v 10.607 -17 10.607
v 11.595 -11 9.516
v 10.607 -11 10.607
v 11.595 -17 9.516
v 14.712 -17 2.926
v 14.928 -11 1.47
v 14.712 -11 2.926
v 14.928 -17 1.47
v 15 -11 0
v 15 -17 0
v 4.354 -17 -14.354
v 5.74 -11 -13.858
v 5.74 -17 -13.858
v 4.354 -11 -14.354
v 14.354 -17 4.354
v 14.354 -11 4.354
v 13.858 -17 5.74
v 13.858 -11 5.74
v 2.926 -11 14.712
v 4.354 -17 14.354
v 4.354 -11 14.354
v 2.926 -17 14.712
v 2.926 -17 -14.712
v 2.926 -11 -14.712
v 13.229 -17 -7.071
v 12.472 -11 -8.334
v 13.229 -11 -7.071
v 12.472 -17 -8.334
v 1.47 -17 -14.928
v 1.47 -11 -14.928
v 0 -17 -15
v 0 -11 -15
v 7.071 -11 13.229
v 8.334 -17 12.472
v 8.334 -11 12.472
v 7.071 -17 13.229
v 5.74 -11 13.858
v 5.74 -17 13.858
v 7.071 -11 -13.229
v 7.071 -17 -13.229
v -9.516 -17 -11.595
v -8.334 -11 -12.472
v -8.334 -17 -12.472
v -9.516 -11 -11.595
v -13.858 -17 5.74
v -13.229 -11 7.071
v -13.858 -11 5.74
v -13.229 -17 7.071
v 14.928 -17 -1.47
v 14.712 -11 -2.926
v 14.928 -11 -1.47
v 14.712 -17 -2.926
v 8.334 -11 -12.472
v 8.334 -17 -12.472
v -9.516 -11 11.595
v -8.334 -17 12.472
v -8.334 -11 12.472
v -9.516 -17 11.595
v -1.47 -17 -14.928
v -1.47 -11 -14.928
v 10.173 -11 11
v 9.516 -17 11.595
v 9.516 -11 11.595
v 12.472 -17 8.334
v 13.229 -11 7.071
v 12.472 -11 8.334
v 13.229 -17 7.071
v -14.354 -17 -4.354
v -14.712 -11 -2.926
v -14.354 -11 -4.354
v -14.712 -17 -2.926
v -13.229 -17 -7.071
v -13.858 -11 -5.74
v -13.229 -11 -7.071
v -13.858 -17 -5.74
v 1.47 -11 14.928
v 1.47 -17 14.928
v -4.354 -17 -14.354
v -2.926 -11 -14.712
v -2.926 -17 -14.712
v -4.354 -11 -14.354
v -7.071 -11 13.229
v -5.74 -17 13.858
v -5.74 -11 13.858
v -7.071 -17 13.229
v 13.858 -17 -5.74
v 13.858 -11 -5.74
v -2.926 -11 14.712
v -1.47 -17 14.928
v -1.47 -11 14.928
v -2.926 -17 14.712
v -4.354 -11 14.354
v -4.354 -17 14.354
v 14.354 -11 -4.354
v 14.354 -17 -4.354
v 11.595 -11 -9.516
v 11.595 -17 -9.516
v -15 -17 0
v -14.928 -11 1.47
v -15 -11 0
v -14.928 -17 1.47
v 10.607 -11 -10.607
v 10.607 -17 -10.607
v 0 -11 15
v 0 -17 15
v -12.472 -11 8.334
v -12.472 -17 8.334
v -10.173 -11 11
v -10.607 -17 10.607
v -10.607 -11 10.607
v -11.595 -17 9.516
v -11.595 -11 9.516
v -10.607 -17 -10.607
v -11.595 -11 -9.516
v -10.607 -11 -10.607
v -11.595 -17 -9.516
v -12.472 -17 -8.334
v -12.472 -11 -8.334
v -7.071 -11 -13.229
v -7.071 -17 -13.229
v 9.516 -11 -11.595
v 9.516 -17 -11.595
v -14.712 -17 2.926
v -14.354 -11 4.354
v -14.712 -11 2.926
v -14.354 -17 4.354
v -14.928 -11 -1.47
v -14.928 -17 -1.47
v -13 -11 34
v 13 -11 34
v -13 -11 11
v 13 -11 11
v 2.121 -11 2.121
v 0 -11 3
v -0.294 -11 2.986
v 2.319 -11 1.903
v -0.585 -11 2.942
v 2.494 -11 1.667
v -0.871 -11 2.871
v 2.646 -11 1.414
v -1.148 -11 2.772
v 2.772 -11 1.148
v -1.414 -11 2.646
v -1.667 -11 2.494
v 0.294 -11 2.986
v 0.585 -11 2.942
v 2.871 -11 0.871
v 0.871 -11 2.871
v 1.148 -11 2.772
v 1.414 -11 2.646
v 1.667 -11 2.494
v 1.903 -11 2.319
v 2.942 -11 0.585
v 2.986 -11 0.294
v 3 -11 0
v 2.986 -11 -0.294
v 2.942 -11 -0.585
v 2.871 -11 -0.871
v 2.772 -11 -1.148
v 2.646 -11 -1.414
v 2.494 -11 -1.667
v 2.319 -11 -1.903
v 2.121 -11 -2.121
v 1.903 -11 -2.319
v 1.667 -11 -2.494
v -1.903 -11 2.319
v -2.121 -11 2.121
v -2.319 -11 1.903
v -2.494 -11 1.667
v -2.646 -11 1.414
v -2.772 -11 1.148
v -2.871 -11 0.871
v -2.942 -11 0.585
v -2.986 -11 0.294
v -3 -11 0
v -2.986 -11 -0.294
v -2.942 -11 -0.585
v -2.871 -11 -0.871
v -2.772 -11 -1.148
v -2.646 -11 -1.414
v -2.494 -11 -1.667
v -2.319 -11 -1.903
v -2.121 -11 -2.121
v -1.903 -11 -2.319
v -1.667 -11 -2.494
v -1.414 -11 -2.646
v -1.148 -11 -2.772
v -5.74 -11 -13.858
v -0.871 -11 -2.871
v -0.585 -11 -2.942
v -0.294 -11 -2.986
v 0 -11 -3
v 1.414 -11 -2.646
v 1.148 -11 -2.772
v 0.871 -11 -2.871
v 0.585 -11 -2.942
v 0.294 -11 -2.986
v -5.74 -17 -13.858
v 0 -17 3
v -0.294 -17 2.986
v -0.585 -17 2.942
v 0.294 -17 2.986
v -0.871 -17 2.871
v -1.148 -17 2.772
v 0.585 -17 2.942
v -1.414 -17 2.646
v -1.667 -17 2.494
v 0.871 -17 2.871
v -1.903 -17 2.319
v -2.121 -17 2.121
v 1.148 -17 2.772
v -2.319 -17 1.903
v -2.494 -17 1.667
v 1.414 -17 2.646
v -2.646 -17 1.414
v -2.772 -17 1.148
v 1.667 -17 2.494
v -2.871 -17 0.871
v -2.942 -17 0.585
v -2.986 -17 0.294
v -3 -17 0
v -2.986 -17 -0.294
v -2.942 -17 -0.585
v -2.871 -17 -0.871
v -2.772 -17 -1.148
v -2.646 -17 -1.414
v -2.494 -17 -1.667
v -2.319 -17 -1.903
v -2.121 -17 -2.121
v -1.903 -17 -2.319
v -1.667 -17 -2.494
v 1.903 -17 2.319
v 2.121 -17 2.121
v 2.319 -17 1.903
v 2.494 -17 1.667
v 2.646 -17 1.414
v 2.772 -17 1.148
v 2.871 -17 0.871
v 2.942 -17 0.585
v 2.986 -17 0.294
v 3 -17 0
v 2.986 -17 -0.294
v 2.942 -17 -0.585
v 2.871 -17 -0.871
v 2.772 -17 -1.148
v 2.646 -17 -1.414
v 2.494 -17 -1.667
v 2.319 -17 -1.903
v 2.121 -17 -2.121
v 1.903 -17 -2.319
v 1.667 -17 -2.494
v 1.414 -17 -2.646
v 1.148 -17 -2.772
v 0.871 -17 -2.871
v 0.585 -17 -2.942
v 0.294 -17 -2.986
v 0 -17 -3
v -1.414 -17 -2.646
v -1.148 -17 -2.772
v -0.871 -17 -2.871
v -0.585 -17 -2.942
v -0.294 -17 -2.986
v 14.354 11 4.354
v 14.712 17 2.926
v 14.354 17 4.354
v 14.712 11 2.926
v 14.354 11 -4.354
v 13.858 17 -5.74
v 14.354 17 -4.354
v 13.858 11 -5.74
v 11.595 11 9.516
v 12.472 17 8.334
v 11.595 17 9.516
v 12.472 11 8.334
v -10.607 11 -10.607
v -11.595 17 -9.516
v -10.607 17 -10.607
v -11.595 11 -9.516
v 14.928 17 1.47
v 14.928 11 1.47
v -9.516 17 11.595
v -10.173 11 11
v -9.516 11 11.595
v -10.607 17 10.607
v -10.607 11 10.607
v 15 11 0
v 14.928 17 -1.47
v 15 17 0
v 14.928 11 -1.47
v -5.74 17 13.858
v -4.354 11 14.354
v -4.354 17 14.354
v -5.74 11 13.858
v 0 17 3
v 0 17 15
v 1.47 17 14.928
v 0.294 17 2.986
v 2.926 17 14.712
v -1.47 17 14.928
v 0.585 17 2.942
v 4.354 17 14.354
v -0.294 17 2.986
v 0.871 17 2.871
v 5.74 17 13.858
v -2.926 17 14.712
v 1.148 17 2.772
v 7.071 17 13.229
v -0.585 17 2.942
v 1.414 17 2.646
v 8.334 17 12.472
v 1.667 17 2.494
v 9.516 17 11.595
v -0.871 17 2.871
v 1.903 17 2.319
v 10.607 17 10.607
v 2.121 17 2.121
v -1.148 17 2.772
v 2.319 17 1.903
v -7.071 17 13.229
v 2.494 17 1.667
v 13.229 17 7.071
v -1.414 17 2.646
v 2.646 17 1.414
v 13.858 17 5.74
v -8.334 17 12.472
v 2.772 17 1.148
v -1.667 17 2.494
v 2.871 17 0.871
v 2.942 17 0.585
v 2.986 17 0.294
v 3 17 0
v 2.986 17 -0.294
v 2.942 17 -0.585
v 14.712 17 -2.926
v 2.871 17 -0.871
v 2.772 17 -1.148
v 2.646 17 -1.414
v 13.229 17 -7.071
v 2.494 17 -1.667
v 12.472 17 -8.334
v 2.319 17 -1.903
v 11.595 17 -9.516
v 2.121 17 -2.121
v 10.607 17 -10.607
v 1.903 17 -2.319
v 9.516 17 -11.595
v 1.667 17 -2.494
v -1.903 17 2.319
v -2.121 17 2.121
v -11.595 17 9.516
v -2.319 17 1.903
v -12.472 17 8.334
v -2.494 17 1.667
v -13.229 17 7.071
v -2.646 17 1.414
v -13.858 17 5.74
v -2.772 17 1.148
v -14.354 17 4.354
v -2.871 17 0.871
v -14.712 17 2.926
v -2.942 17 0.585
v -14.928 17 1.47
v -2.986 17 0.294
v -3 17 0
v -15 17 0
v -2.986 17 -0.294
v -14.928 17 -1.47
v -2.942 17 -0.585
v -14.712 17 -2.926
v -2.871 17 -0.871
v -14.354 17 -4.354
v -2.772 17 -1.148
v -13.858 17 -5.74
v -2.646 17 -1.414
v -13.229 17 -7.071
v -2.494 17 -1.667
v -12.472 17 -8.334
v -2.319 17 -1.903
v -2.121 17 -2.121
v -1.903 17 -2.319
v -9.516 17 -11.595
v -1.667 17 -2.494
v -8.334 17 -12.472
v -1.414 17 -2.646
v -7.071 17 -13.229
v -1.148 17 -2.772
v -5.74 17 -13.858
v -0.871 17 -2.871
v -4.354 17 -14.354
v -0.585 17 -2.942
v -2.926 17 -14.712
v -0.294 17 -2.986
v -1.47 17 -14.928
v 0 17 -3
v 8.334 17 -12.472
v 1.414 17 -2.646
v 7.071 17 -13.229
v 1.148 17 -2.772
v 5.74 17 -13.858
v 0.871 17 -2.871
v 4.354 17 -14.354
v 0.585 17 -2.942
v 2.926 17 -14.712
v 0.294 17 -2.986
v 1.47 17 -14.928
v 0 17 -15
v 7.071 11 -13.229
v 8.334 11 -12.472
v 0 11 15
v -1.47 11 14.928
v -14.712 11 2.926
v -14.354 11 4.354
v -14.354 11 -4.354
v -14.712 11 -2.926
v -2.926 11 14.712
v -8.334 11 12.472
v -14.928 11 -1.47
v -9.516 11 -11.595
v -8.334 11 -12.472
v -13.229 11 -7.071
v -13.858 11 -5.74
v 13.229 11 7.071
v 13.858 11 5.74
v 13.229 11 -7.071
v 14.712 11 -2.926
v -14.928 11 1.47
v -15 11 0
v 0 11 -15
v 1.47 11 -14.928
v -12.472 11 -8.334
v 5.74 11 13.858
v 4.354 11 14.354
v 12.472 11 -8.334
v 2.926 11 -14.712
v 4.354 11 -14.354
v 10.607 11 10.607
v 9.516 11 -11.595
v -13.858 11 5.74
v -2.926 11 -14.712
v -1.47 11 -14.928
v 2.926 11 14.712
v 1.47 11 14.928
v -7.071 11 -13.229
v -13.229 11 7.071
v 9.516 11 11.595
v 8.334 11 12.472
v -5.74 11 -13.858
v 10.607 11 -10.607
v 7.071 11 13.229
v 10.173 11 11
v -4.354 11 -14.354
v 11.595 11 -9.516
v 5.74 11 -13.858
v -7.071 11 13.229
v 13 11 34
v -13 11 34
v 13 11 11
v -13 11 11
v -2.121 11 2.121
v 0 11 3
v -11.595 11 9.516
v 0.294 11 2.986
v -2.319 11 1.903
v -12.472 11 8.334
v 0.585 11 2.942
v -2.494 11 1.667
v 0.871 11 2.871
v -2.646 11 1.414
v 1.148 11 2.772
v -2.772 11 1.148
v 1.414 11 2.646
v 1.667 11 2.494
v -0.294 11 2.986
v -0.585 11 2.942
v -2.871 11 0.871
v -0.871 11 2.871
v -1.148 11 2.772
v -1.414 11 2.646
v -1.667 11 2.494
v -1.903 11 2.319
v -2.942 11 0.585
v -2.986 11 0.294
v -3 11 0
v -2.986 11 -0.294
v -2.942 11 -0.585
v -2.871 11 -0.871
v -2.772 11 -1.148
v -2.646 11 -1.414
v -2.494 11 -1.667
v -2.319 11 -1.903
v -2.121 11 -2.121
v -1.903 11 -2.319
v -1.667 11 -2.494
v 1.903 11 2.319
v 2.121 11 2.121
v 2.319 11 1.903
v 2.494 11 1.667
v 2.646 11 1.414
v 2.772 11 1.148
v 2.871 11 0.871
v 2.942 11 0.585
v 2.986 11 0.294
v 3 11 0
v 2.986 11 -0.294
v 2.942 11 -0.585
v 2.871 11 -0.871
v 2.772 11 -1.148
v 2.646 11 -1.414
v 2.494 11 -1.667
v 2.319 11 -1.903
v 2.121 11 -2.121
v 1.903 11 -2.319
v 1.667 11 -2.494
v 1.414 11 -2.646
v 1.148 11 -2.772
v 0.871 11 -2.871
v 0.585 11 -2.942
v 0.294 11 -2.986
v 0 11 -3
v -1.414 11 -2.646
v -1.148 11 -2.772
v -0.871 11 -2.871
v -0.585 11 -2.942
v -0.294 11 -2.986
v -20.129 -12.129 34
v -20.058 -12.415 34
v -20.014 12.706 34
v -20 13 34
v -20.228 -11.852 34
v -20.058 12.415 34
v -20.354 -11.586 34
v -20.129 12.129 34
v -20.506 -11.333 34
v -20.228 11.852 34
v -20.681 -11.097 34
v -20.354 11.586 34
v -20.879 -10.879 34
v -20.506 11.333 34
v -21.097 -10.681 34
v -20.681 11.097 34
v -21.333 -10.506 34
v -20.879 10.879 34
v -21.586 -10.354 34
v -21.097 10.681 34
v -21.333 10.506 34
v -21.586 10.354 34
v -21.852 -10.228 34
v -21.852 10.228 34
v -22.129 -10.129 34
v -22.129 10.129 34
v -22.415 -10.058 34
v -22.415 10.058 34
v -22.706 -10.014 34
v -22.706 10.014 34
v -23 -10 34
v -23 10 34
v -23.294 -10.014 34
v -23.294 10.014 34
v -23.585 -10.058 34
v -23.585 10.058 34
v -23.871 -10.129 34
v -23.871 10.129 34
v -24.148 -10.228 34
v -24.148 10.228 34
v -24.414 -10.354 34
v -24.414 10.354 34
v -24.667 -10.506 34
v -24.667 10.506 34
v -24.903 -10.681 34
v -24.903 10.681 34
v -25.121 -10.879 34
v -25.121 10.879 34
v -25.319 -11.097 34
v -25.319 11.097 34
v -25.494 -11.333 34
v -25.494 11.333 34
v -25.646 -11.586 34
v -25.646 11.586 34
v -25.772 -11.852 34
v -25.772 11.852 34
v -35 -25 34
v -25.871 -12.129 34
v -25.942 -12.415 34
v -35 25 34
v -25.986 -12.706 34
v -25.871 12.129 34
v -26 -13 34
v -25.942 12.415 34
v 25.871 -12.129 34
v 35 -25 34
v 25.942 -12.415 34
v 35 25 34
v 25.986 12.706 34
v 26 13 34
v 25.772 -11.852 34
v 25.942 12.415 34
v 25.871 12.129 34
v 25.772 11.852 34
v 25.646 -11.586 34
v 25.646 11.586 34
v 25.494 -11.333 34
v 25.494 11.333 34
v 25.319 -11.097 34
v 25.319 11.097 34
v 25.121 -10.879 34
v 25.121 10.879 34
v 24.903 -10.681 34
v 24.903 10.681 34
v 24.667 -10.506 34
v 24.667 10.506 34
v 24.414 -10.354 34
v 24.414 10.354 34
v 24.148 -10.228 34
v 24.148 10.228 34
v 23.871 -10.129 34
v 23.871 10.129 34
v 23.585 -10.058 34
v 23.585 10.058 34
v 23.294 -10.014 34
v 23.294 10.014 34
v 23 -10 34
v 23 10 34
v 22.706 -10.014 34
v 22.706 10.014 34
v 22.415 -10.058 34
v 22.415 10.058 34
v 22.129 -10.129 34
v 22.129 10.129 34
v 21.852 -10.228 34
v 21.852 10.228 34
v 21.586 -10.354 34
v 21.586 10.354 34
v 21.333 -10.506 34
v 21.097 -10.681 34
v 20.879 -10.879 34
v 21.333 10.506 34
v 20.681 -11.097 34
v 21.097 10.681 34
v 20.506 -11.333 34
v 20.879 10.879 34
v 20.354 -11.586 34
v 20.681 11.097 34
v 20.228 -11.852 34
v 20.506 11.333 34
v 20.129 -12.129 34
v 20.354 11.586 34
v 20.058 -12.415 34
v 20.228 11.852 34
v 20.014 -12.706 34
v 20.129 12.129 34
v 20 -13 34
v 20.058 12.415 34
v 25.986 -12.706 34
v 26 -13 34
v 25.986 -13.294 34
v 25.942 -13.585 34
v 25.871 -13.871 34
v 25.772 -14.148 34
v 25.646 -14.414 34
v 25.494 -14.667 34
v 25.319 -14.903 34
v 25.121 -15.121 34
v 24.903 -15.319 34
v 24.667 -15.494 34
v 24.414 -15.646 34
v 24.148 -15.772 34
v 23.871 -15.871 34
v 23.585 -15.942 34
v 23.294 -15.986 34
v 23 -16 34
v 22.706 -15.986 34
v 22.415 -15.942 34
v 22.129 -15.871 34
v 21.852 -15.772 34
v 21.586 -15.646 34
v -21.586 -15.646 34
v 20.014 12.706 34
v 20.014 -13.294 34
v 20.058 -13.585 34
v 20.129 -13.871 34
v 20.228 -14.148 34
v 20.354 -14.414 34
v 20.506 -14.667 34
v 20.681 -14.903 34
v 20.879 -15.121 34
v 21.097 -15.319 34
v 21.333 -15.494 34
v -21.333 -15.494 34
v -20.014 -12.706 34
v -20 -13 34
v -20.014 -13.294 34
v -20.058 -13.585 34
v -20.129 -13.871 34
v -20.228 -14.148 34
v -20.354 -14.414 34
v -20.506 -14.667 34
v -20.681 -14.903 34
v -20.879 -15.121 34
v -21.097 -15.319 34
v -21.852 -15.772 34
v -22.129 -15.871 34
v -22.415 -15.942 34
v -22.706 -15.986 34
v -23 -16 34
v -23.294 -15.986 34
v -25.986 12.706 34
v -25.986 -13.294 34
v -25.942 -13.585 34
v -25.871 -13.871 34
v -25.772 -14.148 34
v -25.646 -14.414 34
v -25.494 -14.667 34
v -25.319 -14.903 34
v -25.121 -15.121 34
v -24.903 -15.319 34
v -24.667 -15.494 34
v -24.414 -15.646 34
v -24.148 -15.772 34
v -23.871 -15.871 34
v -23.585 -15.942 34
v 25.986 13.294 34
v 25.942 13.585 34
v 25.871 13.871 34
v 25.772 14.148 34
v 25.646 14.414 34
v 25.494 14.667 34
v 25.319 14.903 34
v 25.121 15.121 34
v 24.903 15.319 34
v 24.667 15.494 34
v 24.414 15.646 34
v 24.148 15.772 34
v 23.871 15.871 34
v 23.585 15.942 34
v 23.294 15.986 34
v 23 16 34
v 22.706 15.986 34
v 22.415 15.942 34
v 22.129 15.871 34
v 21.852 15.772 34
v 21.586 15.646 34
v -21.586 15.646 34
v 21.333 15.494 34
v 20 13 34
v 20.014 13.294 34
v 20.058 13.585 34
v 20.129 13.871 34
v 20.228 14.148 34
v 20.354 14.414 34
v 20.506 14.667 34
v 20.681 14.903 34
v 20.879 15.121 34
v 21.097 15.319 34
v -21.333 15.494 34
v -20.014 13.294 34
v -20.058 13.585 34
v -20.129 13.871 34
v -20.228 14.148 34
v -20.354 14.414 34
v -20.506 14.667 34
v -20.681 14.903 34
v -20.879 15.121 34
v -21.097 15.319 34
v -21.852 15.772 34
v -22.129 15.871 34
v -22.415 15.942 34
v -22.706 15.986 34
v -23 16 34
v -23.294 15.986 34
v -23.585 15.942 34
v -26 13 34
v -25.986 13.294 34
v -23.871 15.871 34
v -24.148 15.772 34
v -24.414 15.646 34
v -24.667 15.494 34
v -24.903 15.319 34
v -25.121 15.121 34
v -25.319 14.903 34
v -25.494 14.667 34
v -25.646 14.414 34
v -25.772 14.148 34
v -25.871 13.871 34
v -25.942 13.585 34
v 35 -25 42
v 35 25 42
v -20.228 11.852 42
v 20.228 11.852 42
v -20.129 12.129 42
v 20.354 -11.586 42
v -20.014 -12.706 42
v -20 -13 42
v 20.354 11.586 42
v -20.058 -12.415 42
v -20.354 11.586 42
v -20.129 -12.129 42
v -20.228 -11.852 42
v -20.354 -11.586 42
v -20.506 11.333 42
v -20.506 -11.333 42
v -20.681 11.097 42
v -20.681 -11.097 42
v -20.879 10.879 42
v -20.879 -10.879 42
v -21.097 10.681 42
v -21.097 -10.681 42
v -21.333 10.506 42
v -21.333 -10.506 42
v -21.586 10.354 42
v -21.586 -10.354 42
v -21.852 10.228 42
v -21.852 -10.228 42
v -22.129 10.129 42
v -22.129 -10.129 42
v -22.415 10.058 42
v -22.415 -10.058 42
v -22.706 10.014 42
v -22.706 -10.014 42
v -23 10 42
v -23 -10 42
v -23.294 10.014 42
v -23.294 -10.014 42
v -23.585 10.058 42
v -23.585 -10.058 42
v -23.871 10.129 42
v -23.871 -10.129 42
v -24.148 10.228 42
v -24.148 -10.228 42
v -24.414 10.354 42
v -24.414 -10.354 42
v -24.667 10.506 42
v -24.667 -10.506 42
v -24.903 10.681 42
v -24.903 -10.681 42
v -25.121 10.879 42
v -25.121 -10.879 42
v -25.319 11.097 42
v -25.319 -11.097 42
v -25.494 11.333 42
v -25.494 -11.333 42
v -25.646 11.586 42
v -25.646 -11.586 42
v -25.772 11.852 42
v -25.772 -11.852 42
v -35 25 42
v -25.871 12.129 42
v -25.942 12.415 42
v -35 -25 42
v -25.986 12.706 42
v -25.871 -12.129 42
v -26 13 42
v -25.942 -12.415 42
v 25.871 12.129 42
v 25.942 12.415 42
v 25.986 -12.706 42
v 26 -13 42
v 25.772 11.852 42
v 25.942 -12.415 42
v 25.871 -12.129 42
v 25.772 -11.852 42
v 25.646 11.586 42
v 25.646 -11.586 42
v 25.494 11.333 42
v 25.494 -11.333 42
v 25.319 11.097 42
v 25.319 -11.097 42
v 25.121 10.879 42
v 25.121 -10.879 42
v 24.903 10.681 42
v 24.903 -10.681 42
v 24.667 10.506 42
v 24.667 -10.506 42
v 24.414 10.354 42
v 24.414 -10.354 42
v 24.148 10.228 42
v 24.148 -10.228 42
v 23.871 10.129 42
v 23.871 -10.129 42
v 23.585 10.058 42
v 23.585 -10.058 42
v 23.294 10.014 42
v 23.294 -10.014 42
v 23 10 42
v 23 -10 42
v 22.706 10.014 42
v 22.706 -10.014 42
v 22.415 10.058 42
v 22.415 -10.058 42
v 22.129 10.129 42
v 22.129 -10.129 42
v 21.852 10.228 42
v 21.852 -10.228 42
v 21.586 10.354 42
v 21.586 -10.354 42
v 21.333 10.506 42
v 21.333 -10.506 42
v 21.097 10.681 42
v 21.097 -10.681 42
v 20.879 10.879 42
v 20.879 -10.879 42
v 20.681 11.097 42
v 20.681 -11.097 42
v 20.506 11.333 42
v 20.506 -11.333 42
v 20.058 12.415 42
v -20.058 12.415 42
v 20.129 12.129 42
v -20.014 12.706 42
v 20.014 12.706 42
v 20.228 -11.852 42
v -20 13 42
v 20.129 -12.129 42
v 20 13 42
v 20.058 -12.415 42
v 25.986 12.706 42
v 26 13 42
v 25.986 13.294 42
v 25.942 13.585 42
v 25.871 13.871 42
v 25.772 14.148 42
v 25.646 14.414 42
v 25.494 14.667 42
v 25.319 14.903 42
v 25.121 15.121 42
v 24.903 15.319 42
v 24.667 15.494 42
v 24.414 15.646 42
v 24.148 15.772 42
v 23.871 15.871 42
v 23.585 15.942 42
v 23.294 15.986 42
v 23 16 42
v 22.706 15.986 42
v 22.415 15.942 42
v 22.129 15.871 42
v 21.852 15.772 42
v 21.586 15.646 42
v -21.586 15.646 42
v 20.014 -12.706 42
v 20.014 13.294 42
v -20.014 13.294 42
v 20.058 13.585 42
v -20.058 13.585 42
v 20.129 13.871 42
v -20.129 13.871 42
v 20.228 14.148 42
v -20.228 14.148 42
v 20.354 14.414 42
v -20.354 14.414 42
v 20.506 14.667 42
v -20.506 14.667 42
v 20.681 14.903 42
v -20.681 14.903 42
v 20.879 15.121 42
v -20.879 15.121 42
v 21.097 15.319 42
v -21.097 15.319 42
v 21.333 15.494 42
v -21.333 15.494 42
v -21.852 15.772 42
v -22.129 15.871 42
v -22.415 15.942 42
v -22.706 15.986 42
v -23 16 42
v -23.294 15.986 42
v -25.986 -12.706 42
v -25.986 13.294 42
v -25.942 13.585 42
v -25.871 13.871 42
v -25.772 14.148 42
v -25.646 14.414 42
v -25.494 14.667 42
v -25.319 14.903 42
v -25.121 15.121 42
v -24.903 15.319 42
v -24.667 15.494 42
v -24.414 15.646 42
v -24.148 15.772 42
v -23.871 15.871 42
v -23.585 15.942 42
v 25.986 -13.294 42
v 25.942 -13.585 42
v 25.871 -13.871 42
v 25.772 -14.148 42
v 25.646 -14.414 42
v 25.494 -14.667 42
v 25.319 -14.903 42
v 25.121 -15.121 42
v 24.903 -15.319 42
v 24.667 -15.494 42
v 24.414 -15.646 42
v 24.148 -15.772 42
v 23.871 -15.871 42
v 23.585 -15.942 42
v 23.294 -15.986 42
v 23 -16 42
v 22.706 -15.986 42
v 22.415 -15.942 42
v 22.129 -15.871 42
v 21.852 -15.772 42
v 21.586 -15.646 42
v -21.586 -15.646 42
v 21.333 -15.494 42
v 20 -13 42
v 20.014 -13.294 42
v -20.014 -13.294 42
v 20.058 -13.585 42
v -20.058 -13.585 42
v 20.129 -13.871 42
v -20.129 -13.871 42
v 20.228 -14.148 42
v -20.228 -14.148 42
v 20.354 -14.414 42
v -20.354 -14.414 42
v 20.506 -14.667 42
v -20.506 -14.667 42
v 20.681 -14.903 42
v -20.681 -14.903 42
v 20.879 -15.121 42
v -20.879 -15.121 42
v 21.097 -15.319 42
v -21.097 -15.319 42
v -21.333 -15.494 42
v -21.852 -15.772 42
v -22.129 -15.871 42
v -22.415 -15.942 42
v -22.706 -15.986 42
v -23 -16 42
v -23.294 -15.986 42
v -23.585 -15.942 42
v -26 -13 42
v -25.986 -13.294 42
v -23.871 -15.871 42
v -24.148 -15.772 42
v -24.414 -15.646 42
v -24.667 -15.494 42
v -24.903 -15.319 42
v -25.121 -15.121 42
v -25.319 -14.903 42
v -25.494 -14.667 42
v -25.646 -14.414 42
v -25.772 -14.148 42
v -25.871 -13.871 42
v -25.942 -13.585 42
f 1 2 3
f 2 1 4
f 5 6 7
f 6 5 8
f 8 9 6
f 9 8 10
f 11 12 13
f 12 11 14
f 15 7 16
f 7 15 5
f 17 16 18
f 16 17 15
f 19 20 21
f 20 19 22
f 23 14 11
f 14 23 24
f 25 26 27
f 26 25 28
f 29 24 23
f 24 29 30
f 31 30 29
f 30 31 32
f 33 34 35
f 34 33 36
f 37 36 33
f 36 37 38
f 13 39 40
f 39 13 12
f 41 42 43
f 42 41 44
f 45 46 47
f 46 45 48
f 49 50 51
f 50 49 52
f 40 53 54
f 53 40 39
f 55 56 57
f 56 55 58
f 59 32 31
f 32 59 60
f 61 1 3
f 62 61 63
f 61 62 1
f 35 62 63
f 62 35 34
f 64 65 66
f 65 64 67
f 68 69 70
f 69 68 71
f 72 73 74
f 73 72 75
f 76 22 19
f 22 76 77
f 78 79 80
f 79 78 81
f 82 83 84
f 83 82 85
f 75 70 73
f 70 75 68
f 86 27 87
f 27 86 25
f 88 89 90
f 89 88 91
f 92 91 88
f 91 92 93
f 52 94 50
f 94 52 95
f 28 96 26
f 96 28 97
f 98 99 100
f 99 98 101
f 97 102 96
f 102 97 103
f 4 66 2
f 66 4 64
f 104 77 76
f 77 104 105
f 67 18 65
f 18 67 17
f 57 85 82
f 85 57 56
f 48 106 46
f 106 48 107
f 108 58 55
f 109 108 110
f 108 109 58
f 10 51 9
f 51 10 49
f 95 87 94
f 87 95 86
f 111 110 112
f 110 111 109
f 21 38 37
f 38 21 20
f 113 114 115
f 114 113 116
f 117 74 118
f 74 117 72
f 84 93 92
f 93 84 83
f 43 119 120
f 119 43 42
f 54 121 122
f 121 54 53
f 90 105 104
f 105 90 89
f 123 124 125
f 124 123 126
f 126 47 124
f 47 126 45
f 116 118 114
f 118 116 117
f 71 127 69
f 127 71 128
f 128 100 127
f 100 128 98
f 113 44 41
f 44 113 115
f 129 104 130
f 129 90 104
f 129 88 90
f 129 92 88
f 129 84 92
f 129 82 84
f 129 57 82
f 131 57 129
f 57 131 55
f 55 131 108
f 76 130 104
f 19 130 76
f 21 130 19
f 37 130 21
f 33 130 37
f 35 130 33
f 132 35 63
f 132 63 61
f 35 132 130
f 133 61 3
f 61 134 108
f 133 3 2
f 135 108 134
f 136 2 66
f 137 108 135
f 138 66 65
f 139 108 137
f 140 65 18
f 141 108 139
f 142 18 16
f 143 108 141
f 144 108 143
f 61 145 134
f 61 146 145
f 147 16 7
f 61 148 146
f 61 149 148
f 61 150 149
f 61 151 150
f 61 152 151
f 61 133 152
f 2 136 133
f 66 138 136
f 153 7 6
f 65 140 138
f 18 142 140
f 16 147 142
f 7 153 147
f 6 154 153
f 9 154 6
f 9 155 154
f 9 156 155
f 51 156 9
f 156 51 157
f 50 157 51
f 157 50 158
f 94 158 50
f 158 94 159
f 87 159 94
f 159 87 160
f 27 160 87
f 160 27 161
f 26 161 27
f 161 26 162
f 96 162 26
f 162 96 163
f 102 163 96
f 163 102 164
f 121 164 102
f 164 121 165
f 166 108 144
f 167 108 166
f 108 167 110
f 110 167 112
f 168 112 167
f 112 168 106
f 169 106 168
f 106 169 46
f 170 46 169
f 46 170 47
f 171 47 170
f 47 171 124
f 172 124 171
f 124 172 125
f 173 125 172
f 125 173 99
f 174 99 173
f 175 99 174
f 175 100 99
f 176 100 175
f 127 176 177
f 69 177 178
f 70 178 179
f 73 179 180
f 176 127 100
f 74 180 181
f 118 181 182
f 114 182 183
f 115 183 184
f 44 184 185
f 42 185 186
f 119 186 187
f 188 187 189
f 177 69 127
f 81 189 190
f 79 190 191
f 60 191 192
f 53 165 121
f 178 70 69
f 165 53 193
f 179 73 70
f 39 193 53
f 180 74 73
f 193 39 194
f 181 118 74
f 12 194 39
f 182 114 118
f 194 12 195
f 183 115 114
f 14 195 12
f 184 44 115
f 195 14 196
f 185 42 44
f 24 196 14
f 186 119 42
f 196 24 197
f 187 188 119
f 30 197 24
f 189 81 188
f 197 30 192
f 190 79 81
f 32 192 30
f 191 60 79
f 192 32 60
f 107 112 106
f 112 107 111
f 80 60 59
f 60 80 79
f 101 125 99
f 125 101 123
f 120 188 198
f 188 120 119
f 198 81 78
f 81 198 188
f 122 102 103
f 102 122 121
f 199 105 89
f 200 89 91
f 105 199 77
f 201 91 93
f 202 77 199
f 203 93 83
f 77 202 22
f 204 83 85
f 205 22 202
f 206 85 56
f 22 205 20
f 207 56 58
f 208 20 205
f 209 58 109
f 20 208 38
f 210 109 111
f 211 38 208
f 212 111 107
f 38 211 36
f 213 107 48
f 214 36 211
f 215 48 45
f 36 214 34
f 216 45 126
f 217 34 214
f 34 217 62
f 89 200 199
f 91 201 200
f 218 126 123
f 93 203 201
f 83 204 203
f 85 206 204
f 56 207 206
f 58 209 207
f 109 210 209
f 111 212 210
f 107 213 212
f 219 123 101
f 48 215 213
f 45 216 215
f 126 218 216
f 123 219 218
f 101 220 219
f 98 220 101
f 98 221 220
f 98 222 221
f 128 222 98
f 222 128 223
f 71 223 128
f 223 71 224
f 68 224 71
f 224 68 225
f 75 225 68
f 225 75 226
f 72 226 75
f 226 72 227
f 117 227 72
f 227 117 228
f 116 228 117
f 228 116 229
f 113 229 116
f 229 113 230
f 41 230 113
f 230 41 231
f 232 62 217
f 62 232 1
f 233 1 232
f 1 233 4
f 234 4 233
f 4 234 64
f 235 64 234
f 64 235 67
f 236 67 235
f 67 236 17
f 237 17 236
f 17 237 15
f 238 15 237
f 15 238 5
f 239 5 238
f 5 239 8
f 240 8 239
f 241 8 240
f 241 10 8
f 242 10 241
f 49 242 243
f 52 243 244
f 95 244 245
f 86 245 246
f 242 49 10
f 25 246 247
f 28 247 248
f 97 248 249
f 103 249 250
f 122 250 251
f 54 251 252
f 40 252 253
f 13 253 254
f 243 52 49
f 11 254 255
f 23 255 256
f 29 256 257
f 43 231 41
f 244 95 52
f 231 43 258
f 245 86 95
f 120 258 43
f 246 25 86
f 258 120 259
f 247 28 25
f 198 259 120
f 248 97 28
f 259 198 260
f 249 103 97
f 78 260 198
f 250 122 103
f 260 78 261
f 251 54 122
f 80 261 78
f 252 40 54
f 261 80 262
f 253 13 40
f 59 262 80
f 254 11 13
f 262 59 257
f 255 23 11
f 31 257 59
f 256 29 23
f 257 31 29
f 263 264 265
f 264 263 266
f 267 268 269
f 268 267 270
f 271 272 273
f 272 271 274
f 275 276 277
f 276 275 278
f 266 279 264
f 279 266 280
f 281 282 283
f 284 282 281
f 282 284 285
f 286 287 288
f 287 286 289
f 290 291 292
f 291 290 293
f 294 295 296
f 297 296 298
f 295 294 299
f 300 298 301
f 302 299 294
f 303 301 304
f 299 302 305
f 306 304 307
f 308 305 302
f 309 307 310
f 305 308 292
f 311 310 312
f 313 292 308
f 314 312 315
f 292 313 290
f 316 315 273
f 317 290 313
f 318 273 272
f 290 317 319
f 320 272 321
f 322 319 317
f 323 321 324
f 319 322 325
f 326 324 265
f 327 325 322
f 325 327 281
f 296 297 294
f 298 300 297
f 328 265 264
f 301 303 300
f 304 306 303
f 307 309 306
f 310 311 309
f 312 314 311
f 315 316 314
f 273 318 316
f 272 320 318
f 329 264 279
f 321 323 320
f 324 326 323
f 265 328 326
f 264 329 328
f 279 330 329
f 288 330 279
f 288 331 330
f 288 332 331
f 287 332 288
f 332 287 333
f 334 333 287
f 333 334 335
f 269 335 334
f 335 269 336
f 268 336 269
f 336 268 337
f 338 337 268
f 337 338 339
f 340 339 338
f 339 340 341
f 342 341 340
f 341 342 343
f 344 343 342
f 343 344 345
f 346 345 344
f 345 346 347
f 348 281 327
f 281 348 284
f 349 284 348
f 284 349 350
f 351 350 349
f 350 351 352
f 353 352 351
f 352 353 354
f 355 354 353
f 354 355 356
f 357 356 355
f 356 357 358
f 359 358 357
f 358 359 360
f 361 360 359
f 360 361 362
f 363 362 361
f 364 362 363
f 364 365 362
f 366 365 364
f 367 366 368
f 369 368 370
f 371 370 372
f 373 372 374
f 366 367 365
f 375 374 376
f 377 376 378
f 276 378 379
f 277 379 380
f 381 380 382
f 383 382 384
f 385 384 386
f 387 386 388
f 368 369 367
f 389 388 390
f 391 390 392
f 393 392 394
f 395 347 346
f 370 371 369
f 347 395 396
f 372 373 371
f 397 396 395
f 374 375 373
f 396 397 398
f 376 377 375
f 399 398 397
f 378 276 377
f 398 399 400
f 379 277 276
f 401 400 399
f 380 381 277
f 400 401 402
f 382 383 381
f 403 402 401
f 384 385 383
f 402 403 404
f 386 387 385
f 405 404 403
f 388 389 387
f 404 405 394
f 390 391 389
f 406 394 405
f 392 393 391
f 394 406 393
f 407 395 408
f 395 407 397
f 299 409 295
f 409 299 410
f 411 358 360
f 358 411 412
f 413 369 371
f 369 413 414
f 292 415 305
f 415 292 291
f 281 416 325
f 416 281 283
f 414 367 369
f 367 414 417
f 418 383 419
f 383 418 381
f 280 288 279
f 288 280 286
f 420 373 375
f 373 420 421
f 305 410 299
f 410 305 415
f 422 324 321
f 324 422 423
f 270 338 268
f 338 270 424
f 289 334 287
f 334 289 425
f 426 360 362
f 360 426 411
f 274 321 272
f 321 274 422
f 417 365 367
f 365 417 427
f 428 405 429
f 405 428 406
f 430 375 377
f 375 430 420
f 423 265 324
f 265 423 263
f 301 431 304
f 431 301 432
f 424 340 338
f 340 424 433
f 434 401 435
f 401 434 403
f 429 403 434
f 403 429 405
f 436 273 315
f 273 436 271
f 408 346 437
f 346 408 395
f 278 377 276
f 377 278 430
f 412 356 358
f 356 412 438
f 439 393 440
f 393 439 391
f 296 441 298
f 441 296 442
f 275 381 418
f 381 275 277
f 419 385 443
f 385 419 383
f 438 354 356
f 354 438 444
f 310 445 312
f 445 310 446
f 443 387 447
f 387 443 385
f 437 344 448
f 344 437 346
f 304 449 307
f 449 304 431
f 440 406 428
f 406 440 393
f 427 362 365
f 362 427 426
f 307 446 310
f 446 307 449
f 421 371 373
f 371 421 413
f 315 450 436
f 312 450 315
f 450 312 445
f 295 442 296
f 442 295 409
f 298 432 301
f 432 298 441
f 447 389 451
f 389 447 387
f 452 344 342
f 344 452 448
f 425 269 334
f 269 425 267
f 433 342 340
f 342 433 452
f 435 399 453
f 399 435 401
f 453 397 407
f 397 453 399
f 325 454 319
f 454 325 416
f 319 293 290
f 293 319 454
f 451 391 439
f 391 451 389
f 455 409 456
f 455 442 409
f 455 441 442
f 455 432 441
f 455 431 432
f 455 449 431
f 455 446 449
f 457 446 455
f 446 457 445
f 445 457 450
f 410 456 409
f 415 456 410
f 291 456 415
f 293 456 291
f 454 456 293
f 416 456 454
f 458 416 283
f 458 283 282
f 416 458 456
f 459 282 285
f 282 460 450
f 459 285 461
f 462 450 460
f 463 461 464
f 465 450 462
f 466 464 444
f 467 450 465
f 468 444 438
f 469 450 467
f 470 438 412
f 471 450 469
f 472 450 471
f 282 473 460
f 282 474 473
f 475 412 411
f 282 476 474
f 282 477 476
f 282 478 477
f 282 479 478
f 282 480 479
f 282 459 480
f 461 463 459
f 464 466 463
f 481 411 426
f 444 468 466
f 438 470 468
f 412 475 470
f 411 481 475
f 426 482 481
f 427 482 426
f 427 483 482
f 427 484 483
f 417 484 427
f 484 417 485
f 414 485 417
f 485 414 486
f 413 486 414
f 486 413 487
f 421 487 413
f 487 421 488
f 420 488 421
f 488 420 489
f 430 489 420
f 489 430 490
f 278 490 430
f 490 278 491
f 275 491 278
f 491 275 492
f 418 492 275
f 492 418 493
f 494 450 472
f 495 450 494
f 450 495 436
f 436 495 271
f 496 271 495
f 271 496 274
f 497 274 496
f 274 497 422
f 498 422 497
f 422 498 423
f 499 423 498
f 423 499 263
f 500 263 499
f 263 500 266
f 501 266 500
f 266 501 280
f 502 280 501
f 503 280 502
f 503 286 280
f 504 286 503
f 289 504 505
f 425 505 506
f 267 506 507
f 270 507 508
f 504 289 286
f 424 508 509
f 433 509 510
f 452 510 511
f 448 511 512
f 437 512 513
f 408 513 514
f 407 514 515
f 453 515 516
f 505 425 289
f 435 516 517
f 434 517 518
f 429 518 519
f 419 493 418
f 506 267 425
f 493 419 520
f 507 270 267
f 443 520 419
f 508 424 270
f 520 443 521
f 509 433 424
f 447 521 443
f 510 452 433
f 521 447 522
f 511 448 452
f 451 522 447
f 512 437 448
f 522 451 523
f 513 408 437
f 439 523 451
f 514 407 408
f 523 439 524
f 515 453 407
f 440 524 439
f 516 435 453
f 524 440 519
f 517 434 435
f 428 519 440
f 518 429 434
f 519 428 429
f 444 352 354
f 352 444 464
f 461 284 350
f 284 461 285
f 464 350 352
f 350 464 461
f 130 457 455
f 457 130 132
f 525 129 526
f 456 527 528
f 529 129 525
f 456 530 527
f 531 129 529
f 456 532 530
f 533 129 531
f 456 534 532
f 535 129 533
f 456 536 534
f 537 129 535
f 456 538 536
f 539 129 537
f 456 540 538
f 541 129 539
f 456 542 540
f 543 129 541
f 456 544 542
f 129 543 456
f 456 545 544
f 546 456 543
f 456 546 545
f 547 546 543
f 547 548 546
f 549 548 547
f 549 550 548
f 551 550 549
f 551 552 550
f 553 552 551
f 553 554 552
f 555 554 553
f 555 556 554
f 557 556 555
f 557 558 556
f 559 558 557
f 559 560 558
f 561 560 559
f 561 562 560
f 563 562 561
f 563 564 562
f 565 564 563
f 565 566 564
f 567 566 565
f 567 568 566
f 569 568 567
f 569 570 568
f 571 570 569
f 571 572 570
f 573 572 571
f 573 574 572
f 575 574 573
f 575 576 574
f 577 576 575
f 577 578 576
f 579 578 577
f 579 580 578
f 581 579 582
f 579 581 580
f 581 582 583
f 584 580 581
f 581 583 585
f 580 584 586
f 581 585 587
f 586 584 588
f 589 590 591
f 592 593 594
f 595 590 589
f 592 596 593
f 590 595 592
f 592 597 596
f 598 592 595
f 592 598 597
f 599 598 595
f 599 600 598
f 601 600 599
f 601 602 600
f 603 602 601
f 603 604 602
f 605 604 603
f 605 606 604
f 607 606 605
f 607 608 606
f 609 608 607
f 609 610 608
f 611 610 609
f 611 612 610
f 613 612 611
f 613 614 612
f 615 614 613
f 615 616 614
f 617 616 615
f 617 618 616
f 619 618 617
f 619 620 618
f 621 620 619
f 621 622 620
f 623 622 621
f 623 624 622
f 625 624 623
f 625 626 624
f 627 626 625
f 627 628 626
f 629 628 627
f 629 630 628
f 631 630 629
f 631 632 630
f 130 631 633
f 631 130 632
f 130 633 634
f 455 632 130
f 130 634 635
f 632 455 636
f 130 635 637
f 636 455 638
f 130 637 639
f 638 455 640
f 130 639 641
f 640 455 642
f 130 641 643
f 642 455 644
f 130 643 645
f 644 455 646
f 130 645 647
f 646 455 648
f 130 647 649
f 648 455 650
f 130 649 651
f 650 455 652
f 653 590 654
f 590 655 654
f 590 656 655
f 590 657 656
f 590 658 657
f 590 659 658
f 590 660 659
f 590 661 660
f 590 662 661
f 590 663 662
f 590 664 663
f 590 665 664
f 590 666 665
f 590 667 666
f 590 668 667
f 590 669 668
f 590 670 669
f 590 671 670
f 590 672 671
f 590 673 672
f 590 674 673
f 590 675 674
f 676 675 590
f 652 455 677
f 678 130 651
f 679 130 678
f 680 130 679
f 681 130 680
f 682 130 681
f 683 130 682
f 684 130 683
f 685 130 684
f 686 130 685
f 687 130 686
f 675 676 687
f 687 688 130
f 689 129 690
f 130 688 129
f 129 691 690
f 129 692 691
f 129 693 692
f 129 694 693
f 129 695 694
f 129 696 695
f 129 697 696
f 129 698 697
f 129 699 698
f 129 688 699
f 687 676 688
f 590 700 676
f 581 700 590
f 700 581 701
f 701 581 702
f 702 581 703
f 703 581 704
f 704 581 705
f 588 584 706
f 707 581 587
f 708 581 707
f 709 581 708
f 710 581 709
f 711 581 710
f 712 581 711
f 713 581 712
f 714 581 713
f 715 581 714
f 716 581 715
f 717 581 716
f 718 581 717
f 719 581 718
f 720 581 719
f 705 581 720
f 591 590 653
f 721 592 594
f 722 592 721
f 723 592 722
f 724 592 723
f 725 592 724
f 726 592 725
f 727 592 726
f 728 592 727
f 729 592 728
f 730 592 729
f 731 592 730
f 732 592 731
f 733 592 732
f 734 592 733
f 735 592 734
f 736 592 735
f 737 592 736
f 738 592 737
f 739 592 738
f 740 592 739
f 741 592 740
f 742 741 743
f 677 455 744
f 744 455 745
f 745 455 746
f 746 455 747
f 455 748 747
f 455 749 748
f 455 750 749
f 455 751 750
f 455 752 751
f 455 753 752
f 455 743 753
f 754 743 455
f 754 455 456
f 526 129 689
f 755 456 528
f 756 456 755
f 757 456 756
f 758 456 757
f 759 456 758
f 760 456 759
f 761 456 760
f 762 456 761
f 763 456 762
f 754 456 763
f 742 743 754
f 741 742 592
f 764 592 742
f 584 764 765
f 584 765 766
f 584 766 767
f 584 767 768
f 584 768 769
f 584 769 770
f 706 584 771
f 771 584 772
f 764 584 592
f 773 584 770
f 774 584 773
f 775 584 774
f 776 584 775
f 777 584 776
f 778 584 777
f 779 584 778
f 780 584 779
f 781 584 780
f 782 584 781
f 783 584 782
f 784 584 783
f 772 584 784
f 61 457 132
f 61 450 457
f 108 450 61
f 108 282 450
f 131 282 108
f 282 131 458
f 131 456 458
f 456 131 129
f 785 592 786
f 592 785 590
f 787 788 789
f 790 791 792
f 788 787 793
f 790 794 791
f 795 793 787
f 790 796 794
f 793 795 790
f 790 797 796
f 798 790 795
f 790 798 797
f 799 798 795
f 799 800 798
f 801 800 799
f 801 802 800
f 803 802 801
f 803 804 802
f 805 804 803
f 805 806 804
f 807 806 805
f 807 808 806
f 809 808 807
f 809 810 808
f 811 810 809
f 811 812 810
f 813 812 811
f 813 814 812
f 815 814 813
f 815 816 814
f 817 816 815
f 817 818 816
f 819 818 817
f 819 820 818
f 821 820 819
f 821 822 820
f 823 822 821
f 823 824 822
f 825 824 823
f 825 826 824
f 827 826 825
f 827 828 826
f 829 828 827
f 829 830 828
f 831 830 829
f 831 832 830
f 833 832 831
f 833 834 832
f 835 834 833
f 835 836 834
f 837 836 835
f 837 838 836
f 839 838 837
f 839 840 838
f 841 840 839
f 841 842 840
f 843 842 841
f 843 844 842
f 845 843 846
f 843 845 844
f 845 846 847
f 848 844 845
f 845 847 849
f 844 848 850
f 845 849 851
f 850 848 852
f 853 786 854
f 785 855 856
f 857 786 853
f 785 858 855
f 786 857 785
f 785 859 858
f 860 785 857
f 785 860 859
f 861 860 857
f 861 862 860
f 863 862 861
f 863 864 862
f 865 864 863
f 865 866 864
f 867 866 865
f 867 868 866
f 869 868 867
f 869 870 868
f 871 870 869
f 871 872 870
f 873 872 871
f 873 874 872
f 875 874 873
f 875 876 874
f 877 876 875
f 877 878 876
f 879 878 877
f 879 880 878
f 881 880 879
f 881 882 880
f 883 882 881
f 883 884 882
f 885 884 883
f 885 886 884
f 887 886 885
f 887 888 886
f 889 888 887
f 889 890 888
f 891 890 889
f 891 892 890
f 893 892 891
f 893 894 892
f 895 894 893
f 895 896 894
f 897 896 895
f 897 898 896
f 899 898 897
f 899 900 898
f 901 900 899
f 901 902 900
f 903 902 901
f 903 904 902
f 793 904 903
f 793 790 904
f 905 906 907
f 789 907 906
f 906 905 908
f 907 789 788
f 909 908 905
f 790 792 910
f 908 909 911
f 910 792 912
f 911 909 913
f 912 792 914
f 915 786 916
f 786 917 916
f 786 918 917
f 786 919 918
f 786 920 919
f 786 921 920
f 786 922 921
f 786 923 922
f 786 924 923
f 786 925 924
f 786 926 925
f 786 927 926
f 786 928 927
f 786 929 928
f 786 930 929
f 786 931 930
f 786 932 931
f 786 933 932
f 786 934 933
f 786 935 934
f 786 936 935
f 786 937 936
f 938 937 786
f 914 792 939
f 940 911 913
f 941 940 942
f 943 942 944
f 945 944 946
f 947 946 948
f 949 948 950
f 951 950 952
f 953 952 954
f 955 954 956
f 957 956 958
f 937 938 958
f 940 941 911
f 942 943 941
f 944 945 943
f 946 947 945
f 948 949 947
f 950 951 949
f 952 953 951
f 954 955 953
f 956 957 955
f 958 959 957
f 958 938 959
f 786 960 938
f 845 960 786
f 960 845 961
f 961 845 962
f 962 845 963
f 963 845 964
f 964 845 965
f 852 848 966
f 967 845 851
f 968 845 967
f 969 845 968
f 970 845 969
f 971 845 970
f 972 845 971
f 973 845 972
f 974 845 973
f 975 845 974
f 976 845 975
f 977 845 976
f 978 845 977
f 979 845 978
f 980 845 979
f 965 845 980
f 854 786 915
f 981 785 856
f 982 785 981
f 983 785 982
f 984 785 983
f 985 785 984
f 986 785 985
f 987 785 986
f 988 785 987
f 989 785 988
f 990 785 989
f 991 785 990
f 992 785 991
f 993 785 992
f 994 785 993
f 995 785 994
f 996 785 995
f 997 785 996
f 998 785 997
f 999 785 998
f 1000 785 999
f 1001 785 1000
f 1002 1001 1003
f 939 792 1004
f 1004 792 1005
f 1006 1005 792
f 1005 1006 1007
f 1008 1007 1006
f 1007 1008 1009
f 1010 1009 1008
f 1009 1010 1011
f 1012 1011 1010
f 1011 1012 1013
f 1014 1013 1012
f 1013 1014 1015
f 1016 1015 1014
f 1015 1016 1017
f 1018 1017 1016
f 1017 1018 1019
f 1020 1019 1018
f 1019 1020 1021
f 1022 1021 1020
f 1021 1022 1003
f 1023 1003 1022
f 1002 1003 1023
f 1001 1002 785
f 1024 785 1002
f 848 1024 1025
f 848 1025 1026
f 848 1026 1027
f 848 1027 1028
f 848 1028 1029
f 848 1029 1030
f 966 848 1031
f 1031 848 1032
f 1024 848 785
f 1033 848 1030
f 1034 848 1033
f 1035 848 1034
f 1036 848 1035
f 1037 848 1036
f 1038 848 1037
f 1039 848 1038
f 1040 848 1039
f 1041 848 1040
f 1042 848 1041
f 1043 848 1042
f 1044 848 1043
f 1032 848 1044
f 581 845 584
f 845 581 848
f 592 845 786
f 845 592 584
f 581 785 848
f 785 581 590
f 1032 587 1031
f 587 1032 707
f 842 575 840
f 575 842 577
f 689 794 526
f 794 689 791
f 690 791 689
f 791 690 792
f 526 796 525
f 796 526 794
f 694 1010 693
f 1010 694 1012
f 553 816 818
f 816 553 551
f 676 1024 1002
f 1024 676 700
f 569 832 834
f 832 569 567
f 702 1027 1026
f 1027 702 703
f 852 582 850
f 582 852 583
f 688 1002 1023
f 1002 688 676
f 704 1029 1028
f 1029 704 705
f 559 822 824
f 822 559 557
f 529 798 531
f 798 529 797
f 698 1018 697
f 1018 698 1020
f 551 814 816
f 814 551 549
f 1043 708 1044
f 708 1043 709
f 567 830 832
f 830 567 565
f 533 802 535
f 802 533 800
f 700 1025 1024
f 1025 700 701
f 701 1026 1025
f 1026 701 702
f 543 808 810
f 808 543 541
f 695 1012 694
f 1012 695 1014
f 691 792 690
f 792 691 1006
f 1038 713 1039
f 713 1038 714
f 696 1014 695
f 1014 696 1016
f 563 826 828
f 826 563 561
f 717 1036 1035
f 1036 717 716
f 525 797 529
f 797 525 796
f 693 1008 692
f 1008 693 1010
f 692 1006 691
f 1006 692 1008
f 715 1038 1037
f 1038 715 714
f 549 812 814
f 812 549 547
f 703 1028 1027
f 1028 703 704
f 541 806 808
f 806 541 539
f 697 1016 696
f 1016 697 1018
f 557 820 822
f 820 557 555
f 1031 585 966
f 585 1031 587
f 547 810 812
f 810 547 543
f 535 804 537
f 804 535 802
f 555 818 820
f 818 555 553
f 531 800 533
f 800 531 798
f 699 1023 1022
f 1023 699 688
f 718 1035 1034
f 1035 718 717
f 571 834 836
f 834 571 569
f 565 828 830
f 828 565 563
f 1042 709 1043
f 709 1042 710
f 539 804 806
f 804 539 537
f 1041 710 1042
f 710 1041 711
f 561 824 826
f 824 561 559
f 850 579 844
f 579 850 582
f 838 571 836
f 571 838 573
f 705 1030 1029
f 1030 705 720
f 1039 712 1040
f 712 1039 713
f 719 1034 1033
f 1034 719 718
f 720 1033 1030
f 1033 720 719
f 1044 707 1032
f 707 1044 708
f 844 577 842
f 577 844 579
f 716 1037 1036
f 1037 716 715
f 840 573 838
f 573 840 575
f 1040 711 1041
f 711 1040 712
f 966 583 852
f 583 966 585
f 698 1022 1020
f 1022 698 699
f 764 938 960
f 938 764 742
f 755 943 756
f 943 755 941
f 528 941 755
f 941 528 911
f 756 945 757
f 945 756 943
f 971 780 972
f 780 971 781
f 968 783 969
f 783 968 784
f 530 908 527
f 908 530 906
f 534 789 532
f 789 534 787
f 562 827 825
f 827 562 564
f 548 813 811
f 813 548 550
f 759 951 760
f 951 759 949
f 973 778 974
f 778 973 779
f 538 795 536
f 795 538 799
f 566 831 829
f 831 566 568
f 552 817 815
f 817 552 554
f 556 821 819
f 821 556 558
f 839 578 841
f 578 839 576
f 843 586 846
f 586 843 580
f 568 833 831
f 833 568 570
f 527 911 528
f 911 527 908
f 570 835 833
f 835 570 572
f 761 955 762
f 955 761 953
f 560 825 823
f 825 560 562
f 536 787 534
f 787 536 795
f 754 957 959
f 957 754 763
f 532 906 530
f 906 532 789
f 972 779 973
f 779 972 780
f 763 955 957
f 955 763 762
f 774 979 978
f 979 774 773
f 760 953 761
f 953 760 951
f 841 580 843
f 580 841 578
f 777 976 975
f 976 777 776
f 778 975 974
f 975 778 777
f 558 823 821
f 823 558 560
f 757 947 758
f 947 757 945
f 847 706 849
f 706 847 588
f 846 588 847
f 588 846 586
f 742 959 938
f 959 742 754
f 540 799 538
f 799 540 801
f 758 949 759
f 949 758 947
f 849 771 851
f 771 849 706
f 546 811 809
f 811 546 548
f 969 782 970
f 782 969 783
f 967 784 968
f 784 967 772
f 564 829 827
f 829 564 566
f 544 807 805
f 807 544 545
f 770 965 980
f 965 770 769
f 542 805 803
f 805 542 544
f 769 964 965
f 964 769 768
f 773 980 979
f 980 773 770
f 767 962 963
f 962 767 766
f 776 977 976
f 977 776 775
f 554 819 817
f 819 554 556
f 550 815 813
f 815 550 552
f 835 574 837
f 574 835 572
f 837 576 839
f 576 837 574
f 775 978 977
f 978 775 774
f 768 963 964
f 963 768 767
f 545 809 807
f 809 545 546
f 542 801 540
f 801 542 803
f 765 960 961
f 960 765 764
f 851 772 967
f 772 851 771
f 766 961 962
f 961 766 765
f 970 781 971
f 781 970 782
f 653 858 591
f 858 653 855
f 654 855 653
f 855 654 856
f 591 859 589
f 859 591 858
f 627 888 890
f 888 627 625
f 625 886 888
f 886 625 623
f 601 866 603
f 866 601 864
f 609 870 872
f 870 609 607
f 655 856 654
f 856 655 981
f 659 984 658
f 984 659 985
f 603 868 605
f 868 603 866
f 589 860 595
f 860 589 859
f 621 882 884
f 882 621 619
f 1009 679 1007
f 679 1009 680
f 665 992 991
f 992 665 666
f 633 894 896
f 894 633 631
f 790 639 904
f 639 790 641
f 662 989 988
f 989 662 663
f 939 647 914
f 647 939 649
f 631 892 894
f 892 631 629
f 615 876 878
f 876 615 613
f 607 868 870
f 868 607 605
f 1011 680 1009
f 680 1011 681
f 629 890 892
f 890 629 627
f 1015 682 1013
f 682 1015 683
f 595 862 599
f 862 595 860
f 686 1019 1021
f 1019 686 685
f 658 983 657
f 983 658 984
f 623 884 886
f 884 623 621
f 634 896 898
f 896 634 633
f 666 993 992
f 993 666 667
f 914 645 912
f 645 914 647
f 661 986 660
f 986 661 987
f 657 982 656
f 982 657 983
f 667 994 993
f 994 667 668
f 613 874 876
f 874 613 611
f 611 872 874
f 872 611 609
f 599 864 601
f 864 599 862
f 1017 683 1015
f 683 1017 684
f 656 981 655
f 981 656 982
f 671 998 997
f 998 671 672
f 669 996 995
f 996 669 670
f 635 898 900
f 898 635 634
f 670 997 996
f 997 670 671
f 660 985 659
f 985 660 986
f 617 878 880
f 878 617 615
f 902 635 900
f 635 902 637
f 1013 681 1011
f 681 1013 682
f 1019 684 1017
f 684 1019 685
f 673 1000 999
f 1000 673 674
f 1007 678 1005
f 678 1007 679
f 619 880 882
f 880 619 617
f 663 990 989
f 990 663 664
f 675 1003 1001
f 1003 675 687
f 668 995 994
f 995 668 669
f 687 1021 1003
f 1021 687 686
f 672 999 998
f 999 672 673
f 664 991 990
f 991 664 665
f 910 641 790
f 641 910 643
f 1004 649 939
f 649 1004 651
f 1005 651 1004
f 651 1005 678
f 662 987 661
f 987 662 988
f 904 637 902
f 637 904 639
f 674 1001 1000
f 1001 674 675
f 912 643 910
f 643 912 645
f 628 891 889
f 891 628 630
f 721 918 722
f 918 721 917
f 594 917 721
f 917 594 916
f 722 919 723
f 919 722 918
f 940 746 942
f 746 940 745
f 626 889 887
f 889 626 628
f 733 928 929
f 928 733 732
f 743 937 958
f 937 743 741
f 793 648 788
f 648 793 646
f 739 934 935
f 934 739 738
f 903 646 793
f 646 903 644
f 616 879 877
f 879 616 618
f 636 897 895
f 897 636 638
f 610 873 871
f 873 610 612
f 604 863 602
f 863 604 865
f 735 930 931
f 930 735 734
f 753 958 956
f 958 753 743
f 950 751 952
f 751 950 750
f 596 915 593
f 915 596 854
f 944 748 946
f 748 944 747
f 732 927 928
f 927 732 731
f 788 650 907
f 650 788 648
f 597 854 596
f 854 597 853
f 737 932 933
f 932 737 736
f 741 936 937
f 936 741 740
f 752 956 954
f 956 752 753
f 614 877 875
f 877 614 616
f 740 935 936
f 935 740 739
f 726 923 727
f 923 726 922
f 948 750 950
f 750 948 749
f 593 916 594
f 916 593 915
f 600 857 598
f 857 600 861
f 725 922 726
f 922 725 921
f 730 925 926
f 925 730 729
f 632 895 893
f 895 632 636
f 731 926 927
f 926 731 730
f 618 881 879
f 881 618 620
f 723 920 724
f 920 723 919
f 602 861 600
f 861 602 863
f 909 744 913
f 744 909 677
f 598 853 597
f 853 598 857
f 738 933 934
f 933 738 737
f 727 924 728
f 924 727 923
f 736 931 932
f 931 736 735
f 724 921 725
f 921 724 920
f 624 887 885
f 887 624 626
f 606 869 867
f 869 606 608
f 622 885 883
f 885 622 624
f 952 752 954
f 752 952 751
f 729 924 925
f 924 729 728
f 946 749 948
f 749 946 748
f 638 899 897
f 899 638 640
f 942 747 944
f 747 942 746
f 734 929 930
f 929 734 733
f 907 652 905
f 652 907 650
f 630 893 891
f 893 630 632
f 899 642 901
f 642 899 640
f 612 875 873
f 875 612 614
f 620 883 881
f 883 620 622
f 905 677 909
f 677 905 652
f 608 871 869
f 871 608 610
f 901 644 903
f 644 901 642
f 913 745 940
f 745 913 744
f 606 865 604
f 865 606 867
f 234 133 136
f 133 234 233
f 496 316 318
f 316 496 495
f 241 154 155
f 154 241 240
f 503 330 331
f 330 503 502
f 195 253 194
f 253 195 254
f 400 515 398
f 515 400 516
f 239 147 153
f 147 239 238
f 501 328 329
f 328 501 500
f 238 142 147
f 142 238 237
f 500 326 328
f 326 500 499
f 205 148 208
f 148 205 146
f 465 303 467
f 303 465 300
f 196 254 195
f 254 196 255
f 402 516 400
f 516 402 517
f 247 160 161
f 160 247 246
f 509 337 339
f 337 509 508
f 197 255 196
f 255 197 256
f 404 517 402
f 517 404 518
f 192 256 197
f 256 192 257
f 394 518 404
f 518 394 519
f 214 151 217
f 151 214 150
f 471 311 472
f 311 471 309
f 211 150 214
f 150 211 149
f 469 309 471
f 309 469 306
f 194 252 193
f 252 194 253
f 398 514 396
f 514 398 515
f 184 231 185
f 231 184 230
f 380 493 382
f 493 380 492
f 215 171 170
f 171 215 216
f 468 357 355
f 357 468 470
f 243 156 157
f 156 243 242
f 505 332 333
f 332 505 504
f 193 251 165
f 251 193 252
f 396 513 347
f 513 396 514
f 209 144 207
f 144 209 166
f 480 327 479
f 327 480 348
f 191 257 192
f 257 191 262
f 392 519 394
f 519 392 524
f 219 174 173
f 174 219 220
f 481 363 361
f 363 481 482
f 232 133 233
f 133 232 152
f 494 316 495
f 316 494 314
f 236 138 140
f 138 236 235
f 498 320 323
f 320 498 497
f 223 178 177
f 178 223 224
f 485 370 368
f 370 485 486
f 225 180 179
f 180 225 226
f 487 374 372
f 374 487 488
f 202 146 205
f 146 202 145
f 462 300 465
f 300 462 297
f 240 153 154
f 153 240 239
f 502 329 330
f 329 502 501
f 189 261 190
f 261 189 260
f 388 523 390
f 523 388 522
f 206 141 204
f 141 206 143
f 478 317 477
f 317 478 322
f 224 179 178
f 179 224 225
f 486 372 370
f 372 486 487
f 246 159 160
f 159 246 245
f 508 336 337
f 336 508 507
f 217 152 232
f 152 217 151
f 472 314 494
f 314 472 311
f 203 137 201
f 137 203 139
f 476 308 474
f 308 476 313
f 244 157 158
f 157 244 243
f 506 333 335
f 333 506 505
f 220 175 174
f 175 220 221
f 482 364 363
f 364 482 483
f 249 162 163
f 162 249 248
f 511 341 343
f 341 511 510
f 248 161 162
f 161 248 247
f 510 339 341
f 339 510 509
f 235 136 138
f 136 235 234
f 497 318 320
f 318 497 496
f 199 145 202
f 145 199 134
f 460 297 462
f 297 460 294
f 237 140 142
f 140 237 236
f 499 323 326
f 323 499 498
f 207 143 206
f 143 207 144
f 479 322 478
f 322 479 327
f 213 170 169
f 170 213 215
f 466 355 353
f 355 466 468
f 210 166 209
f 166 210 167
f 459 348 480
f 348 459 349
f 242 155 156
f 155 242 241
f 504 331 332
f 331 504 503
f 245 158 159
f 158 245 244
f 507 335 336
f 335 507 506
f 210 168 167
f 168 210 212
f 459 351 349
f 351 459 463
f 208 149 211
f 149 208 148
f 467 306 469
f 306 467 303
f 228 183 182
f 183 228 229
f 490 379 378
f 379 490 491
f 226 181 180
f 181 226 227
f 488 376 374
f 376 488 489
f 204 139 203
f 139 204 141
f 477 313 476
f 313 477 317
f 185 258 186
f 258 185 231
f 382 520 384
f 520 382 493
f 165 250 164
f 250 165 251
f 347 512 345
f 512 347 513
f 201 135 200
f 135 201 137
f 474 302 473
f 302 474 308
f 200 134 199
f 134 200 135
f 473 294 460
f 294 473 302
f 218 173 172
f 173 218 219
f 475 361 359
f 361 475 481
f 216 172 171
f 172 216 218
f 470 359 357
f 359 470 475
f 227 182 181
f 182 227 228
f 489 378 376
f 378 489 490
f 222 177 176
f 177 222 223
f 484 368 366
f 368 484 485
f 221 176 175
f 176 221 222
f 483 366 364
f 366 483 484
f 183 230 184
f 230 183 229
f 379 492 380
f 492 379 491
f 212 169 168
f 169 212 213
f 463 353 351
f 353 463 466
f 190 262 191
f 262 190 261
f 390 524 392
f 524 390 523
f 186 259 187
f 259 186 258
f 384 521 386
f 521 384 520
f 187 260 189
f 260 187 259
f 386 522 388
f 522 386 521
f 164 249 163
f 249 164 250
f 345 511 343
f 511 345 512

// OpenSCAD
// file: params.scad
$fn = 64;

femur_length_mm = 110;
tibia_length_mm = 100;

hip_hub_width_mm = 22;
hip_hub_radius_mm = 11;
hip_pin_dia_mm = 6;

femur_shaft_prox_dia_mm = 20;
femur_shaft_dist_dia_mm = 16;
femur_prox_offset_mm = 8;
femur_dist_offset_mm = 10;
femur_bridge_height_mm = 8;

knee_fork_gap_mm = 12;
knee_fork_plate_mm = 6;
knee_hub_radius_mm = 13;
knee_pin_dia_mm = 8;

tibia_hub_radius_mm = 10;
tibia_shaft_prox_dia_mm = 14;
tibia_shaft_dist_dia_mm = 10;
tibia_prox_offset_mm = 8;
tibia_dist_offset_mm = 8;

ankle_hub_radius_mm = 9;
ankle_hub_width_mm = 16;
ankle_pin_dia_mm = 6;

knee_angle_deg = 25;
hip_angle_deg = 0;
ankle_angle_deg = -(hip_angle_deg + knee_angle_deg);

hip_base_gap_mm = hip_hub_width_mm;
hip_base_plate_mm = 6;
hip_base_radius_mm = 15;
hip_base_tower_top_mm = 34;
hip_base_tower_width_x_mm = 26;
hip_base_mount_size_x_mm = 70;
hip_base_mount_size_y_mm = 50;
hip_base_mount_thickness_mm = 8;
hip_base_bolt_dia_mm = 6;

foot_plate_mm = 5;
foot_fork_radius_mm = 11;
foot_column_width_x_mm = 24;
foot_column_top_mm = -ankle_hub_radius_mm;
foot_column_bottom_mm = -19;
foot_sole_top_mm = -18;
foot_sole_length_mm = 85;
foot_sole_width_mm = 34;
foot_sole_thickness_mm = 8;
foot_sole_center_x_mm = 27.5;
// main file
include <params.scad>

module hip_base() {
    difference() {
        union() {
            for (s = [-1, 1])
                translate([0, s * (hip_base_gap_mm + hip_base_plate_mm) / 2, 0])
                    rotate([90, 0, 0])
                        cylinder(h = hip_base_plate_mm, d = 2 * hip_base_radius_mm, center = true);

            translate([0, 0, (hip_hub_radius_mm + hip_base_tower_top_mm) / 2])
                cube([
                    hip_base_tower_width_x_mm,
                    hip_base_gap_mm,
                    hip_base_tower_top_mm - hip_hub_radius_mm
                ], center = true);

            translate([0, 0, hip_base_tower_top_mm + hip_base_mount_thickness_mm / 2])
                cube([
                    hip_base_mount_size_x_mm,
                    hip_base_mount_size_y_mm,
                    hip_base_mount_thickness_mm
                ], center = true);
        }

        rotate([90, 0, 0])
            cylinder(
                h = hip_base_gap_mm + 2 * hip_base_plate_mm + 2,
                d = hip_pin_dia_mm,
                center = true
            );

        for (x = [-1, 1], y = [-1, 1])
            translate([
                x * (hip_base_mount_size_x_mm / 2 - 12),
                y * (hip_base_mount_size_y_mm / 2 - 12),
                hip_base_tower_top_mm + hip_base_mount_thickness_mm / 2
            ])
                cylinder(
                    h = hip_base_mount_thickness_mm + 2,
                    d = hip_base_bolt_dia_mm,
                    center = true
                );
    }
}

hip_base();
